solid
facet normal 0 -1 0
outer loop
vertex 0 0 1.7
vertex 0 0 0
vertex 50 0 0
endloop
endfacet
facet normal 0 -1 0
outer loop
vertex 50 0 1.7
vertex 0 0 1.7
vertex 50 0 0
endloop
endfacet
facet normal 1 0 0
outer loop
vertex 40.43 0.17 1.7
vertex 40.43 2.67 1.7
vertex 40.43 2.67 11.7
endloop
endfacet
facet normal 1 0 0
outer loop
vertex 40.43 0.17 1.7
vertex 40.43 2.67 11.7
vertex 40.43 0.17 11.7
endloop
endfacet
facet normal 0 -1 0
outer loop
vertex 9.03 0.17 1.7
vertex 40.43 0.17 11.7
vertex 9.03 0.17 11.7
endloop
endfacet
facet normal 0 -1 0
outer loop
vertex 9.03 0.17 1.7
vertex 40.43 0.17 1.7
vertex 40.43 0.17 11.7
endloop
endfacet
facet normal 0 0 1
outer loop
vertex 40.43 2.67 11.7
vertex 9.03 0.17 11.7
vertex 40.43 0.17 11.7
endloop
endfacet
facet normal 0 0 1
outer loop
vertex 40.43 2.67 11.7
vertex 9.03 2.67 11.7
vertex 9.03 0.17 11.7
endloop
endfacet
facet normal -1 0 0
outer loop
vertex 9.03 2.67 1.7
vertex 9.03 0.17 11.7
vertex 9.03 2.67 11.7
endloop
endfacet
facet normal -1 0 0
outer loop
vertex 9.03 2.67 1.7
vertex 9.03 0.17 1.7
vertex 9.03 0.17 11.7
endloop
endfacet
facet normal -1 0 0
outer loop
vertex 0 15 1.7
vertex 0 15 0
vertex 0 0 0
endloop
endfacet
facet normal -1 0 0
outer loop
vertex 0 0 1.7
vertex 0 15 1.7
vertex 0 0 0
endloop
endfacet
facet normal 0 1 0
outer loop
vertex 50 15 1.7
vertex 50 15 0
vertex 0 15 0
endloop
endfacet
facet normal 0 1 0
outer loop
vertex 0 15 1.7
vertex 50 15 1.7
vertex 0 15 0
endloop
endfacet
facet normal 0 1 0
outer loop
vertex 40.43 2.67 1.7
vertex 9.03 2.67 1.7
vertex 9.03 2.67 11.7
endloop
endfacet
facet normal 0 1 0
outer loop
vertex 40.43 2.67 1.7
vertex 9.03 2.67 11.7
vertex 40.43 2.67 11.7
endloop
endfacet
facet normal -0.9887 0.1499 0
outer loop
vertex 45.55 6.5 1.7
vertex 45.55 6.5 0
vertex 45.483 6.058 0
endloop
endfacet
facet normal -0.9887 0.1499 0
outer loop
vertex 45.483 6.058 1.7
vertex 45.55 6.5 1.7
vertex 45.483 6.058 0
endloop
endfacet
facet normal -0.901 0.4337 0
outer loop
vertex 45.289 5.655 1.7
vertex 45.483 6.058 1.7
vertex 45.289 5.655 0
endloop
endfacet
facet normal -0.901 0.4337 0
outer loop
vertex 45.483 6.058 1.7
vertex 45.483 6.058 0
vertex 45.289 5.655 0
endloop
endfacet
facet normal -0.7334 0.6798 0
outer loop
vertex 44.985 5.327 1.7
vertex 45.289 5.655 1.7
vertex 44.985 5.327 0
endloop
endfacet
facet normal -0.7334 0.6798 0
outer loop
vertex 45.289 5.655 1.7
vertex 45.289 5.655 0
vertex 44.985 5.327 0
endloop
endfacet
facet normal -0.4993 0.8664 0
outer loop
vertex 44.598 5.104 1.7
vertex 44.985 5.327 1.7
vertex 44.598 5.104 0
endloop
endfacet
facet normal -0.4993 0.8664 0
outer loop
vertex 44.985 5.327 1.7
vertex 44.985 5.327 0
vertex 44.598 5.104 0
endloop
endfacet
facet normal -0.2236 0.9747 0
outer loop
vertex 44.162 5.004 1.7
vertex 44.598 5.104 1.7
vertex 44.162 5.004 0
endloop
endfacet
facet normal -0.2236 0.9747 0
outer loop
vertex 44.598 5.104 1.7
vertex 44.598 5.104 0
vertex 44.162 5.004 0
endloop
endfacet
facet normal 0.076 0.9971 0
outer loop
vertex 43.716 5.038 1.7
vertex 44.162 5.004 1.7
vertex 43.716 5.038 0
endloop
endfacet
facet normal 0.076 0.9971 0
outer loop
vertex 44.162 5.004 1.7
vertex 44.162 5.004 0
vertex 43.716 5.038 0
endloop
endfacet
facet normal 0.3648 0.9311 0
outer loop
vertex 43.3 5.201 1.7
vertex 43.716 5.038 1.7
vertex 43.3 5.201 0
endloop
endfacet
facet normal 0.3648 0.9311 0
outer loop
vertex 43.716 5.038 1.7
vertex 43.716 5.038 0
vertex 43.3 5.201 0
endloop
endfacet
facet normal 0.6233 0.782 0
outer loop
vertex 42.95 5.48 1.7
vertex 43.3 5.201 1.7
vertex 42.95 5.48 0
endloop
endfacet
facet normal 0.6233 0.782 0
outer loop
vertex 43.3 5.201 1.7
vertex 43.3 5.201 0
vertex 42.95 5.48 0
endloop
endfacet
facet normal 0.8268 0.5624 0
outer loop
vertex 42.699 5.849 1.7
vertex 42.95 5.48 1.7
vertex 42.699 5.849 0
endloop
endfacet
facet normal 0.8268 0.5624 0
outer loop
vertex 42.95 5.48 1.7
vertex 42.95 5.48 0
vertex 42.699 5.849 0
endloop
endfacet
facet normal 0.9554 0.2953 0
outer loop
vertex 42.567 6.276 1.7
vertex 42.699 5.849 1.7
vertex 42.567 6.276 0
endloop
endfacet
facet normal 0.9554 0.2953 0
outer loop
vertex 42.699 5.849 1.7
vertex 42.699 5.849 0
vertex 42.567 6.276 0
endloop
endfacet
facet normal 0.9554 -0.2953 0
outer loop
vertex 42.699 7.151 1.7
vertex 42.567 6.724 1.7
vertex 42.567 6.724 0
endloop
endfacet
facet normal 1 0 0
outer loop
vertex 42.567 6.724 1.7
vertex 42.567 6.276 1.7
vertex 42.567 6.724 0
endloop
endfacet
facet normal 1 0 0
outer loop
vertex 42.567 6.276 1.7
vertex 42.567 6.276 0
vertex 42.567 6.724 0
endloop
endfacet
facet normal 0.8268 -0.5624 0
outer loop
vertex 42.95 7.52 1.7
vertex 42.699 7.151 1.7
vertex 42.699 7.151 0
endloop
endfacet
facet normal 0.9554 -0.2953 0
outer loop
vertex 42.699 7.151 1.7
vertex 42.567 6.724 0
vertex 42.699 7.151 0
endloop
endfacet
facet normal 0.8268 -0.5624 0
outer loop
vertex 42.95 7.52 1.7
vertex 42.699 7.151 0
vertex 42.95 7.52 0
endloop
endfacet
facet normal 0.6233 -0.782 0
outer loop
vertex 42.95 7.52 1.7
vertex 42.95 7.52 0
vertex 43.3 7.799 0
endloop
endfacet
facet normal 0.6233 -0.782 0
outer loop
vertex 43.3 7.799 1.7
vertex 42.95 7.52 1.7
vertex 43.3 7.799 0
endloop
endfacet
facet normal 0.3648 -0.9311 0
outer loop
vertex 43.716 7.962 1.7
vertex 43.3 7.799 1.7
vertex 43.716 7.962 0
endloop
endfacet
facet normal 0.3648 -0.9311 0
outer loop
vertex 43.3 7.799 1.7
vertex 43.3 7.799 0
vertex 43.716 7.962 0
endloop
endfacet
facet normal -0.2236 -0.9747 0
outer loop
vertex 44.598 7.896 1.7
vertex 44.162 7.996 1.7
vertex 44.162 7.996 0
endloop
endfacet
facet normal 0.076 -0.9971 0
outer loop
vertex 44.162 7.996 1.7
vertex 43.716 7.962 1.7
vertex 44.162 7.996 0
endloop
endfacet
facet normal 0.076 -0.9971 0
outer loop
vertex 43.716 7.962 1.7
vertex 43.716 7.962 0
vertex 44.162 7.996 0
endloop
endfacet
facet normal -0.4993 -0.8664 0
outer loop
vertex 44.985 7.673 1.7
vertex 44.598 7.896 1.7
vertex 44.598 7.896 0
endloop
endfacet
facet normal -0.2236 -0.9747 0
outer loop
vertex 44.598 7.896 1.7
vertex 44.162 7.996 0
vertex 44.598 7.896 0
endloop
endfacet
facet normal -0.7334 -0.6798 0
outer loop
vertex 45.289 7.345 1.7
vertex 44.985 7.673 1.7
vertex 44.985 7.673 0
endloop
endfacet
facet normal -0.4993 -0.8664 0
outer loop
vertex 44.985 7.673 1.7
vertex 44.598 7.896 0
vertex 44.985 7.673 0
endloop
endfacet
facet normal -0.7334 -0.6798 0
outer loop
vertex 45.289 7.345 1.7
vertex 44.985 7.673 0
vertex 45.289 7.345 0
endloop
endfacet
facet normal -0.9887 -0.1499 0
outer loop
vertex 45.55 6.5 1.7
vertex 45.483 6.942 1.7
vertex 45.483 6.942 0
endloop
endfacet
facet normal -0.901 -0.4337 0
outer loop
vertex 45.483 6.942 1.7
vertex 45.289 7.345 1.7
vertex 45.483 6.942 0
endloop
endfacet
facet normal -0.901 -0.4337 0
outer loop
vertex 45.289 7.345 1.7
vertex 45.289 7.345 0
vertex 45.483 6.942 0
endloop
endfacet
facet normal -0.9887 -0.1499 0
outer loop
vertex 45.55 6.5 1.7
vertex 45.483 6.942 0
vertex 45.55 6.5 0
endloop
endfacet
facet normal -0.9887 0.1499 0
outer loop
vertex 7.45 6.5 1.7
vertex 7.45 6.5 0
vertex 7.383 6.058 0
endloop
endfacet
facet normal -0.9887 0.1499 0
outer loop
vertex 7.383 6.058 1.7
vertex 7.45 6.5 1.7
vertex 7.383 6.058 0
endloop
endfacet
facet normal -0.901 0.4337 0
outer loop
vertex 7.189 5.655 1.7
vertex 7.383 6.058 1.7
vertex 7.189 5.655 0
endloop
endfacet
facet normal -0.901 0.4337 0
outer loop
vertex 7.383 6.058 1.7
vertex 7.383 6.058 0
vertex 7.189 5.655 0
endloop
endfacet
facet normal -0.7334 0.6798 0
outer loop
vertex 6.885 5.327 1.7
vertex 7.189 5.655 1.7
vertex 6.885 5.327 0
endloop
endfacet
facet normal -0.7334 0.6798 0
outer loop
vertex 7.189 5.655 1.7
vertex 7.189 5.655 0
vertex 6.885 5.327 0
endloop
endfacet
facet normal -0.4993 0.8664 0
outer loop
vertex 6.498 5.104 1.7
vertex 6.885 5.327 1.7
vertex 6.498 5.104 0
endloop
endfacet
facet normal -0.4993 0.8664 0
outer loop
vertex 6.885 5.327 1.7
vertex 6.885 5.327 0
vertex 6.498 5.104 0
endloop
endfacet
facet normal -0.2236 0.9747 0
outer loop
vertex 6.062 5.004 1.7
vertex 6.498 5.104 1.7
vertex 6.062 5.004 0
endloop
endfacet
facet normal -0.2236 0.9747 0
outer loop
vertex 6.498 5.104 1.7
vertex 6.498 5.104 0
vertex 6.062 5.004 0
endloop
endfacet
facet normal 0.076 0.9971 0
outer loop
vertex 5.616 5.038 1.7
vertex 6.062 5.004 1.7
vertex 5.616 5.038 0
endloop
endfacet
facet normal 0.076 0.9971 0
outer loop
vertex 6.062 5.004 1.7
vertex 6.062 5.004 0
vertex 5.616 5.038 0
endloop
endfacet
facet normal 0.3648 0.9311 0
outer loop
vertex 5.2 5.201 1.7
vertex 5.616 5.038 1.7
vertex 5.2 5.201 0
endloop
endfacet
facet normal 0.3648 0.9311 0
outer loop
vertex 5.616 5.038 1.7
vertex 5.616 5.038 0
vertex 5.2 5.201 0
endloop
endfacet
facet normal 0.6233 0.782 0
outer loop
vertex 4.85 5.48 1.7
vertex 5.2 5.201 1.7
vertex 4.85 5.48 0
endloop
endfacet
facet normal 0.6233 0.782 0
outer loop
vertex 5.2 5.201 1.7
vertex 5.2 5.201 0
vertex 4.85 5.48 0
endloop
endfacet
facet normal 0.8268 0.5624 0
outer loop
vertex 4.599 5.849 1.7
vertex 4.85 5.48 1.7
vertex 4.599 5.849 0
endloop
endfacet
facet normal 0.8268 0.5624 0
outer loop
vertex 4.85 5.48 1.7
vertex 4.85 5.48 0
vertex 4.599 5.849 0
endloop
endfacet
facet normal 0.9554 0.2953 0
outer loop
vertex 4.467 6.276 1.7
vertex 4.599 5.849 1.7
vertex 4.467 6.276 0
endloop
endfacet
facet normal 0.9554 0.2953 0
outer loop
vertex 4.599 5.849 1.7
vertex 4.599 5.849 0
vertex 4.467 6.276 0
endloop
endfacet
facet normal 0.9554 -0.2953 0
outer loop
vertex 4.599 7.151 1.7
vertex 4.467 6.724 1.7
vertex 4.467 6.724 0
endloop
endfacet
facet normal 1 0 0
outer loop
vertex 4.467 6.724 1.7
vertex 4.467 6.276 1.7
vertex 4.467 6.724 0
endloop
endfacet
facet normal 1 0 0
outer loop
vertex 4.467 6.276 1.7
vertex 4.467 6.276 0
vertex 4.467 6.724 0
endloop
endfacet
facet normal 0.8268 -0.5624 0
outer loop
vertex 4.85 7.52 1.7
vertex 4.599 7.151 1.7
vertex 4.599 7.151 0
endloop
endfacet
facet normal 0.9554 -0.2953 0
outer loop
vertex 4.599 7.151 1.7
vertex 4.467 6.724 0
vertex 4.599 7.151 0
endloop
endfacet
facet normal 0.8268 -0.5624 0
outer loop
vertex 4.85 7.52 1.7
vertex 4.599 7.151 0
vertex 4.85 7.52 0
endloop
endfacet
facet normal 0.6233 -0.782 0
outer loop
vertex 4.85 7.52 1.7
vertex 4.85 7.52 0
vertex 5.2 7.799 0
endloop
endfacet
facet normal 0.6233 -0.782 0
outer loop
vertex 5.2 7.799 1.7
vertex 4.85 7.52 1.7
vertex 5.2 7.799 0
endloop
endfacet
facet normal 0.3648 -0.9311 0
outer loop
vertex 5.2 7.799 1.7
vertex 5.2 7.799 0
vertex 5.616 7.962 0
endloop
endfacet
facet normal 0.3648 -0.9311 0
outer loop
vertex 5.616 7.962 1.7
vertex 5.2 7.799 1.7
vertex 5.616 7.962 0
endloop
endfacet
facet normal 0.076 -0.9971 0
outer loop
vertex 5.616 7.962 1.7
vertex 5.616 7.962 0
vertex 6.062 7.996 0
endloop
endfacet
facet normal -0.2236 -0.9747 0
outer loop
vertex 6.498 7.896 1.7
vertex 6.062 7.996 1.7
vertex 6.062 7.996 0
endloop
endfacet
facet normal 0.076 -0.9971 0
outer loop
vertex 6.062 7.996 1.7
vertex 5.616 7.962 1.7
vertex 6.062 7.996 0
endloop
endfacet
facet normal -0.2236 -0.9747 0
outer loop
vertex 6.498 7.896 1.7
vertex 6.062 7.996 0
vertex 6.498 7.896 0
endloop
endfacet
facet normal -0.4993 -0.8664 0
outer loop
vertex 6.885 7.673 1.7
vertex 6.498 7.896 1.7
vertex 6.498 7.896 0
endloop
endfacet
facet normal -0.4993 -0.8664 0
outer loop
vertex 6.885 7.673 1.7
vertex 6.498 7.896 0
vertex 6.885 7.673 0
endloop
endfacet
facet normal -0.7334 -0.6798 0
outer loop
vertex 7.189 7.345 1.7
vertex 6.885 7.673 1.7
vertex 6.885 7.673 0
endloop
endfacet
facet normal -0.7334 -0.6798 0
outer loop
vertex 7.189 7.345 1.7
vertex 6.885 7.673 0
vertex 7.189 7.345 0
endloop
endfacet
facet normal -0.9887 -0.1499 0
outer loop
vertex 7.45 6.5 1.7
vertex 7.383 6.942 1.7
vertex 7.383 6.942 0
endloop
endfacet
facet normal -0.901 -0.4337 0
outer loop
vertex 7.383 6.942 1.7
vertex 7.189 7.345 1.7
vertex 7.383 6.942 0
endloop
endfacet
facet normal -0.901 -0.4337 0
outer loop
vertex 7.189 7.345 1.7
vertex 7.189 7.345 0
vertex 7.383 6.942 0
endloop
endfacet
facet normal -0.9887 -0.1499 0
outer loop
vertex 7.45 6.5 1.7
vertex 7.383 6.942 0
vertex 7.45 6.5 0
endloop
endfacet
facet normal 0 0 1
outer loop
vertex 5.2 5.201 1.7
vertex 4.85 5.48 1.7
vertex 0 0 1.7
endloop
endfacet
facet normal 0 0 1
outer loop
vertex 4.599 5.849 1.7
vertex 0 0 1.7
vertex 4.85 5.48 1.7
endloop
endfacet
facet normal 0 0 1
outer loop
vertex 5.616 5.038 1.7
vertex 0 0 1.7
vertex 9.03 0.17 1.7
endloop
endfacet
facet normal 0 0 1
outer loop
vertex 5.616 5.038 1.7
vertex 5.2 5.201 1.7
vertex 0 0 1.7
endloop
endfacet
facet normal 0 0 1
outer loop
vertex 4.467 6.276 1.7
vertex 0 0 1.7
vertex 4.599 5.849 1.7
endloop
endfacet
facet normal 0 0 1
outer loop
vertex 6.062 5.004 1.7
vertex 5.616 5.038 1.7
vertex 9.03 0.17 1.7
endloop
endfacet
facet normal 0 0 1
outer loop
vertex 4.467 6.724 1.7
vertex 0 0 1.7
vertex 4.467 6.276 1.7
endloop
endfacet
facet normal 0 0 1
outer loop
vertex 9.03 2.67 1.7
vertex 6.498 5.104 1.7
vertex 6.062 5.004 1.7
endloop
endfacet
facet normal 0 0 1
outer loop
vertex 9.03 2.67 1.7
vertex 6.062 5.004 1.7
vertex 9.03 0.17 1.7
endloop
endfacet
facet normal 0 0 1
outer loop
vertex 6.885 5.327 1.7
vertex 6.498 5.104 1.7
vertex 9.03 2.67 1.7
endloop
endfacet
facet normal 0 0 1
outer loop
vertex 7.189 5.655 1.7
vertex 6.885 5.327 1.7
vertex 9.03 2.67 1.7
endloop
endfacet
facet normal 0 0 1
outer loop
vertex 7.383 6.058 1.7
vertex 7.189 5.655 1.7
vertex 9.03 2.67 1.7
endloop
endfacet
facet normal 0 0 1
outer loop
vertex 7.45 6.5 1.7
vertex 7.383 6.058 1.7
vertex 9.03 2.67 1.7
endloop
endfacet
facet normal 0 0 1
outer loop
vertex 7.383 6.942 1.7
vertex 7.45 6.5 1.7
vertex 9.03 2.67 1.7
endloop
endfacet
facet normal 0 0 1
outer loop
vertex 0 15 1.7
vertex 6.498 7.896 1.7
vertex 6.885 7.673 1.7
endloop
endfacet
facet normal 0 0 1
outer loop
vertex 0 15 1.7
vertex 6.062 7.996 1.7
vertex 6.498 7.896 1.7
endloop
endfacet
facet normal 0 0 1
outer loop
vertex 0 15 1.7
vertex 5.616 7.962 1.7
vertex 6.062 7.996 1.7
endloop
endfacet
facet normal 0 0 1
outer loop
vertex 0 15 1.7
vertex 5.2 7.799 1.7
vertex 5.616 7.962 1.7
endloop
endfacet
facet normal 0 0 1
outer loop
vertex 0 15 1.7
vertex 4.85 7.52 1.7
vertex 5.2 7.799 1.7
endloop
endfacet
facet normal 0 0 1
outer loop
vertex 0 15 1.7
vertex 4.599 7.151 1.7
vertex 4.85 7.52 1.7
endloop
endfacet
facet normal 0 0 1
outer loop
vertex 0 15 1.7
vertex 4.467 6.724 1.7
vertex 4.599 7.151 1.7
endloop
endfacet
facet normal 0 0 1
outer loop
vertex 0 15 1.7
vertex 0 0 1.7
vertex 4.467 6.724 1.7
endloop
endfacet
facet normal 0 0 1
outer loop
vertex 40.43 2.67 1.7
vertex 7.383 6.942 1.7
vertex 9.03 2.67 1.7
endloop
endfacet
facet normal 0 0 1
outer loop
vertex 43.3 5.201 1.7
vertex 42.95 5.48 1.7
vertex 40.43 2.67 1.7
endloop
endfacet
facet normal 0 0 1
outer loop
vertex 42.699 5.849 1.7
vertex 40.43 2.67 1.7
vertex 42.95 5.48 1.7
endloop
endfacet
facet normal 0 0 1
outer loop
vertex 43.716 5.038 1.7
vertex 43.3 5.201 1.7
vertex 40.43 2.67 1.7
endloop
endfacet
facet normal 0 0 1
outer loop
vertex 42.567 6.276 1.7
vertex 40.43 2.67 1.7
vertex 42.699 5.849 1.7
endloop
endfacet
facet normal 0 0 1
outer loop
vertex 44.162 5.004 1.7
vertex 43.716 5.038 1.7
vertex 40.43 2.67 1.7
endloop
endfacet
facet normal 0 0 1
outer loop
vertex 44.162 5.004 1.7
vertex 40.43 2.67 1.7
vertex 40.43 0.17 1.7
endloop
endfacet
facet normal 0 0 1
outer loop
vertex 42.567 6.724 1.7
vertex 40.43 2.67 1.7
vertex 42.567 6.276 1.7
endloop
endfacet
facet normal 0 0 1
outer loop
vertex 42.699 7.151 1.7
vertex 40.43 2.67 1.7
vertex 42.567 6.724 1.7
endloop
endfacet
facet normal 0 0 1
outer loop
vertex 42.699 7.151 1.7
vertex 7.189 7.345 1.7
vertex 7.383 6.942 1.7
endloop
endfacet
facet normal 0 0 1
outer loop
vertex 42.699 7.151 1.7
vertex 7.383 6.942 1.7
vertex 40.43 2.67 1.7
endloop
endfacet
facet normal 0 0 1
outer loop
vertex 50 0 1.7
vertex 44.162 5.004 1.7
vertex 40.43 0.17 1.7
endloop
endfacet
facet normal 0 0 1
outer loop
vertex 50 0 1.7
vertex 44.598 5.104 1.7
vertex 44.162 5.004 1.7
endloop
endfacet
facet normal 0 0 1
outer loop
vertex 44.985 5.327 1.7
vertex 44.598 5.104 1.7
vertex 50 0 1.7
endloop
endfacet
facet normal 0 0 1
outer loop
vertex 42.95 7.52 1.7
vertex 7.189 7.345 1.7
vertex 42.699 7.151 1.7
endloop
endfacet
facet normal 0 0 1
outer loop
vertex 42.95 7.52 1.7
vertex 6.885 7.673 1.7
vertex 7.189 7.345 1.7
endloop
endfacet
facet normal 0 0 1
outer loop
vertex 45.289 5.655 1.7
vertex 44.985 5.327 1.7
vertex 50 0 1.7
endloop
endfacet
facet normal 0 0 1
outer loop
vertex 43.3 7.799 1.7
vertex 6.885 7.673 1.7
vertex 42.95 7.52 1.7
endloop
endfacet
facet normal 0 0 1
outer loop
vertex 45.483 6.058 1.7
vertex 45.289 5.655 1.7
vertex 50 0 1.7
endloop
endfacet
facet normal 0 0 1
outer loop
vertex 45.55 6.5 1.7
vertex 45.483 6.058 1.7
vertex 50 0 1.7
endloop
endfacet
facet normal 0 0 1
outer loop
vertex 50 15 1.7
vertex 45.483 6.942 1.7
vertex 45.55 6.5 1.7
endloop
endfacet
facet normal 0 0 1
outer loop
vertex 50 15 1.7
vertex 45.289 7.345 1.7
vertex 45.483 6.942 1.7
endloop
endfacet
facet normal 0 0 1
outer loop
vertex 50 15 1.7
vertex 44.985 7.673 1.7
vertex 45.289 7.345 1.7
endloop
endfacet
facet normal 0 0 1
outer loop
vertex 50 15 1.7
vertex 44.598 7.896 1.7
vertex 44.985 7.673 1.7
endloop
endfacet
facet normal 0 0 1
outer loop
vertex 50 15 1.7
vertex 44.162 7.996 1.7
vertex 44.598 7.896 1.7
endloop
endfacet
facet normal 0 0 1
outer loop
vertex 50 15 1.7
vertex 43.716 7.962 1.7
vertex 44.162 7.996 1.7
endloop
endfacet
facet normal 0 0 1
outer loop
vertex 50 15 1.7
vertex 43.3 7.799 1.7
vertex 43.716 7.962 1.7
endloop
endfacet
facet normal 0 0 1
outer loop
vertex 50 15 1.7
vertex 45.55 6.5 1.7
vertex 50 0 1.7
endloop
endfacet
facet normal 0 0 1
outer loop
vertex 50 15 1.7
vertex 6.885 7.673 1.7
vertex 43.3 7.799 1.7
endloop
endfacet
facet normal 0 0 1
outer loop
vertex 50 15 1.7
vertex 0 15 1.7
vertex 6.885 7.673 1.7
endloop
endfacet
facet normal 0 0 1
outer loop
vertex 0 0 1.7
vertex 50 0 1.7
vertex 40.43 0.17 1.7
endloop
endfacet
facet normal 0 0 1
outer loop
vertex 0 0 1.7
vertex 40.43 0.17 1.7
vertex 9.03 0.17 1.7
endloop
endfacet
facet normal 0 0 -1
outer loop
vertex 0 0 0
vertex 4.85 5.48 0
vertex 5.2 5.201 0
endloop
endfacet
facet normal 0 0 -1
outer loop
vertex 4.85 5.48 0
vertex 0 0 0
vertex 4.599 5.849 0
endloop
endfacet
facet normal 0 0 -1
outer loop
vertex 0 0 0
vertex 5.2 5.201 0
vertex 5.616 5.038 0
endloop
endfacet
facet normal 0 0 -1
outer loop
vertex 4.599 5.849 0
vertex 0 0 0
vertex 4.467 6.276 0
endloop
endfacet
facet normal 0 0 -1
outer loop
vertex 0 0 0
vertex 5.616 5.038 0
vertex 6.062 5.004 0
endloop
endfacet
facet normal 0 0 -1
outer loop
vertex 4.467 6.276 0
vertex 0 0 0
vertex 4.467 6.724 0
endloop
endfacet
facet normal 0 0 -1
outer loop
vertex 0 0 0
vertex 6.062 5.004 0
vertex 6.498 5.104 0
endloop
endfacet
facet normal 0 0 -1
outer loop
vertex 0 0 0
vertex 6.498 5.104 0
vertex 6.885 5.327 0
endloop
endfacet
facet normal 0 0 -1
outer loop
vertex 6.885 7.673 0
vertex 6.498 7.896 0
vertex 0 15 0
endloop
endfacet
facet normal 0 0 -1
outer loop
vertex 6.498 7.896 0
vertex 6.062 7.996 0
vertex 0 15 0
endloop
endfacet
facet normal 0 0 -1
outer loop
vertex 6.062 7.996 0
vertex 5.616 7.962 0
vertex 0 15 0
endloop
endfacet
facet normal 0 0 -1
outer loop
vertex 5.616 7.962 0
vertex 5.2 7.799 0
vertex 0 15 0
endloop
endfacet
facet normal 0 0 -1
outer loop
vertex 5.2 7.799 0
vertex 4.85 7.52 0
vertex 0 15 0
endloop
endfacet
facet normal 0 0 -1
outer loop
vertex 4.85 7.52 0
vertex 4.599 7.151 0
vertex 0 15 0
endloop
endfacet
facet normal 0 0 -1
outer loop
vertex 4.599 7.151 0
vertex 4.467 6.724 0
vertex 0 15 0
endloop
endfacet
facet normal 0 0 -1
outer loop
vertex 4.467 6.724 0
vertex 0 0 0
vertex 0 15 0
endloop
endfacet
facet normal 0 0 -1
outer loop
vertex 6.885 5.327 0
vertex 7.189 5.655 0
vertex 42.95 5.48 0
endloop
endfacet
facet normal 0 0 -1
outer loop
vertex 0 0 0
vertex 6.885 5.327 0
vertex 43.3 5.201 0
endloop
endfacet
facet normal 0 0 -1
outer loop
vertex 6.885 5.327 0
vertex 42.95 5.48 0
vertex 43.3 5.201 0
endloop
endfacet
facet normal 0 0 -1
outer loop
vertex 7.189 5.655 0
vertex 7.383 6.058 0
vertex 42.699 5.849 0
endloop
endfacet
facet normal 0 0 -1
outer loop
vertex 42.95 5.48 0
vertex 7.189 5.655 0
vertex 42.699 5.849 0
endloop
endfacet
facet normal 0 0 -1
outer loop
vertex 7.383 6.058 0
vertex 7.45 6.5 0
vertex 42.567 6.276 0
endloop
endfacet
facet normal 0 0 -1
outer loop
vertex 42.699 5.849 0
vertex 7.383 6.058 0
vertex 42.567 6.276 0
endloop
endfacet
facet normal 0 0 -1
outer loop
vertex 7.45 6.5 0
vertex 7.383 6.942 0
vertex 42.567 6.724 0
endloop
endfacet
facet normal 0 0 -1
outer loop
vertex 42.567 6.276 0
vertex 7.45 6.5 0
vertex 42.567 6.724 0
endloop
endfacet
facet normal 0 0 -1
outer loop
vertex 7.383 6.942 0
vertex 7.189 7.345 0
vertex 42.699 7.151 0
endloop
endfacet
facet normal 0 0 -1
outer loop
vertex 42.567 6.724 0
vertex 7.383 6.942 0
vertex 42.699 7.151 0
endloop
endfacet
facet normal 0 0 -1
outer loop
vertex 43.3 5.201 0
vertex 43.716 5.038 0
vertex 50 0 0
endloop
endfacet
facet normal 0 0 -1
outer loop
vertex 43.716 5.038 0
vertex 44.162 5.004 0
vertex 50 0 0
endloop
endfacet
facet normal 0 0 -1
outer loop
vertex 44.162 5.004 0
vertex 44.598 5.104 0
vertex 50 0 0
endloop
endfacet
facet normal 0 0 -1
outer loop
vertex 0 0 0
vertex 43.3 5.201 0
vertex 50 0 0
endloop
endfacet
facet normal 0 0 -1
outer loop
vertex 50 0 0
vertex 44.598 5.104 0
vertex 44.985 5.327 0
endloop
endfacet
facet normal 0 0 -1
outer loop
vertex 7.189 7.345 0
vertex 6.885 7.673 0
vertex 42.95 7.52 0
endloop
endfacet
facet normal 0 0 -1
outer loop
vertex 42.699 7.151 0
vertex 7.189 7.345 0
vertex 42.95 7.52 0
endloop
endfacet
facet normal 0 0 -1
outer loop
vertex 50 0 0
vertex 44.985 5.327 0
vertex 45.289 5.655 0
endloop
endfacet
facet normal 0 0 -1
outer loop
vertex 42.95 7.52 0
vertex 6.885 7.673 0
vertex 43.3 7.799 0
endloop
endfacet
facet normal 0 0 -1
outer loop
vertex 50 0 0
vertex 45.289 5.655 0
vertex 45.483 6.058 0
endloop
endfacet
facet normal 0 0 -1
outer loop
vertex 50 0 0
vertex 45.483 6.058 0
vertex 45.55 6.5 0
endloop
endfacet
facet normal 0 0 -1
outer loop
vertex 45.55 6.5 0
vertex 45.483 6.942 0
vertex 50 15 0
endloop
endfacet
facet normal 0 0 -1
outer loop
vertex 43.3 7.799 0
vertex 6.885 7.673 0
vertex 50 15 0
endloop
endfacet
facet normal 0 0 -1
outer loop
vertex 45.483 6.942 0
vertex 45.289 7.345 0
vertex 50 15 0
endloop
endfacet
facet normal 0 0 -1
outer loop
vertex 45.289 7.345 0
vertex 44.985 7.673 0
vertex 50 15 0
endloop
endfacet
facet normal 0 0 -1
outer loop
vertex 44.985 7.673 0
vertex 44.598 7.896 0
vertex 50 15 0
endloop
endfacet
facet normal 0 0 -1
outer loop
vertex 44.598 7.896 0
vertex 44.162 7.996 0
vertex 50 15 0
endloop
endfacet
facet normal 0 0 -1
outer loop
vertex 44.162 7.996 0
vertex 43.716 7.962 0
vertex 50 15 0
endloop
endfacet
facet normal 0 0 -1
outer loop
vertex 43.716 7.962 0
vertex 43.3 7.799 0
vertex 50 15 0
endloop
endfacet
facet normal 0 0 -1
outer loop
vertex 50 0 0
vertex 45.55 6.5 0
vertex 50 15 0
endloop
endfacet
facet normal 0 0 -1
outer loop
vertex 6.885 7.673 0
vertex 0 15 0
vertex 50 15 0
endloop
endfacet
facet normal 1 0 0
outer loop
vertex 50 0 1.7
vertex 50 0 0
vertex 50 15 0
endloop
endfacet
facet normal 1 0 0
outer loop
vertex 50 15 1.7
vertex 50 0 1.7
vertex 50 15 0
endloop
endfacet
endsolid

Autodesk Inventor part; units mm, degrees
ref_plane "YZ Plane" through (0, 0, 0) normal (1, 0, 0) x (0, 1, 0)
ref_plane "XZ Plane" through (0, 0, 0) normal (0, 1, 0) x (-1, 0, 0)
ref_plane "XY Plane" through (0, 0, 0) normal (0, 0, 1) x (1, 0, 0)
sketch "Sketch1" plane through (0, 0, 0) normal (0, 0, 1) x (1, 0, 0)
  line L0 (0, 0) -> (50, 0)
  line L1 (50, 0) -> (50, 15)
  line L2 (50, 15) -> (0, 15)
  line L3 (0, 15) -> (0, 0)
  circle A0 centre (5.95, 6.5) radius 1.5
  circle A1 centre (44.05, 6.5) radius 1.5
  dimension "d0" = 50
  dimension "d1" = 15
  dimension "d4" = 3
  dimension "d5" = 3
  dimension "d6" = 38.1
  dimension "d7" = 5.95
  dimension "d8" = 6.5
  dimension "d9" = 6.5
extrude "Extrusion1" add sketch "Sketch1" along normal blind 1.7
sketch "Sketch2" plane through (0, 0, 1.7) normal (0, 0, 1) x (1, 0, 0)
  line L0 (9.03, 2.67) -> (40.43, 2.67)
  line L1 (40.43, 2.67) -> (40.43, 0.17)
  line L2 (40.43, 0.17) -> (9.03, 0.17)
  line L3 (9.03, 0.17) -> (9.03, 2.67)
  circle A0 centre (5.95, 6.5) radius 1.5 projected
  point P0 (0, 0)
  dimension "d10" = 31.4
  dimension "d11" = 2.5
  dimension "d12" = 3.83
  dimension "d13" = 3.08
extrude "Extrusion2" add sketch "Sketch2" along normal blind 10 contours L0 L1 L2 L3
properties part number "DeviceConnector"
